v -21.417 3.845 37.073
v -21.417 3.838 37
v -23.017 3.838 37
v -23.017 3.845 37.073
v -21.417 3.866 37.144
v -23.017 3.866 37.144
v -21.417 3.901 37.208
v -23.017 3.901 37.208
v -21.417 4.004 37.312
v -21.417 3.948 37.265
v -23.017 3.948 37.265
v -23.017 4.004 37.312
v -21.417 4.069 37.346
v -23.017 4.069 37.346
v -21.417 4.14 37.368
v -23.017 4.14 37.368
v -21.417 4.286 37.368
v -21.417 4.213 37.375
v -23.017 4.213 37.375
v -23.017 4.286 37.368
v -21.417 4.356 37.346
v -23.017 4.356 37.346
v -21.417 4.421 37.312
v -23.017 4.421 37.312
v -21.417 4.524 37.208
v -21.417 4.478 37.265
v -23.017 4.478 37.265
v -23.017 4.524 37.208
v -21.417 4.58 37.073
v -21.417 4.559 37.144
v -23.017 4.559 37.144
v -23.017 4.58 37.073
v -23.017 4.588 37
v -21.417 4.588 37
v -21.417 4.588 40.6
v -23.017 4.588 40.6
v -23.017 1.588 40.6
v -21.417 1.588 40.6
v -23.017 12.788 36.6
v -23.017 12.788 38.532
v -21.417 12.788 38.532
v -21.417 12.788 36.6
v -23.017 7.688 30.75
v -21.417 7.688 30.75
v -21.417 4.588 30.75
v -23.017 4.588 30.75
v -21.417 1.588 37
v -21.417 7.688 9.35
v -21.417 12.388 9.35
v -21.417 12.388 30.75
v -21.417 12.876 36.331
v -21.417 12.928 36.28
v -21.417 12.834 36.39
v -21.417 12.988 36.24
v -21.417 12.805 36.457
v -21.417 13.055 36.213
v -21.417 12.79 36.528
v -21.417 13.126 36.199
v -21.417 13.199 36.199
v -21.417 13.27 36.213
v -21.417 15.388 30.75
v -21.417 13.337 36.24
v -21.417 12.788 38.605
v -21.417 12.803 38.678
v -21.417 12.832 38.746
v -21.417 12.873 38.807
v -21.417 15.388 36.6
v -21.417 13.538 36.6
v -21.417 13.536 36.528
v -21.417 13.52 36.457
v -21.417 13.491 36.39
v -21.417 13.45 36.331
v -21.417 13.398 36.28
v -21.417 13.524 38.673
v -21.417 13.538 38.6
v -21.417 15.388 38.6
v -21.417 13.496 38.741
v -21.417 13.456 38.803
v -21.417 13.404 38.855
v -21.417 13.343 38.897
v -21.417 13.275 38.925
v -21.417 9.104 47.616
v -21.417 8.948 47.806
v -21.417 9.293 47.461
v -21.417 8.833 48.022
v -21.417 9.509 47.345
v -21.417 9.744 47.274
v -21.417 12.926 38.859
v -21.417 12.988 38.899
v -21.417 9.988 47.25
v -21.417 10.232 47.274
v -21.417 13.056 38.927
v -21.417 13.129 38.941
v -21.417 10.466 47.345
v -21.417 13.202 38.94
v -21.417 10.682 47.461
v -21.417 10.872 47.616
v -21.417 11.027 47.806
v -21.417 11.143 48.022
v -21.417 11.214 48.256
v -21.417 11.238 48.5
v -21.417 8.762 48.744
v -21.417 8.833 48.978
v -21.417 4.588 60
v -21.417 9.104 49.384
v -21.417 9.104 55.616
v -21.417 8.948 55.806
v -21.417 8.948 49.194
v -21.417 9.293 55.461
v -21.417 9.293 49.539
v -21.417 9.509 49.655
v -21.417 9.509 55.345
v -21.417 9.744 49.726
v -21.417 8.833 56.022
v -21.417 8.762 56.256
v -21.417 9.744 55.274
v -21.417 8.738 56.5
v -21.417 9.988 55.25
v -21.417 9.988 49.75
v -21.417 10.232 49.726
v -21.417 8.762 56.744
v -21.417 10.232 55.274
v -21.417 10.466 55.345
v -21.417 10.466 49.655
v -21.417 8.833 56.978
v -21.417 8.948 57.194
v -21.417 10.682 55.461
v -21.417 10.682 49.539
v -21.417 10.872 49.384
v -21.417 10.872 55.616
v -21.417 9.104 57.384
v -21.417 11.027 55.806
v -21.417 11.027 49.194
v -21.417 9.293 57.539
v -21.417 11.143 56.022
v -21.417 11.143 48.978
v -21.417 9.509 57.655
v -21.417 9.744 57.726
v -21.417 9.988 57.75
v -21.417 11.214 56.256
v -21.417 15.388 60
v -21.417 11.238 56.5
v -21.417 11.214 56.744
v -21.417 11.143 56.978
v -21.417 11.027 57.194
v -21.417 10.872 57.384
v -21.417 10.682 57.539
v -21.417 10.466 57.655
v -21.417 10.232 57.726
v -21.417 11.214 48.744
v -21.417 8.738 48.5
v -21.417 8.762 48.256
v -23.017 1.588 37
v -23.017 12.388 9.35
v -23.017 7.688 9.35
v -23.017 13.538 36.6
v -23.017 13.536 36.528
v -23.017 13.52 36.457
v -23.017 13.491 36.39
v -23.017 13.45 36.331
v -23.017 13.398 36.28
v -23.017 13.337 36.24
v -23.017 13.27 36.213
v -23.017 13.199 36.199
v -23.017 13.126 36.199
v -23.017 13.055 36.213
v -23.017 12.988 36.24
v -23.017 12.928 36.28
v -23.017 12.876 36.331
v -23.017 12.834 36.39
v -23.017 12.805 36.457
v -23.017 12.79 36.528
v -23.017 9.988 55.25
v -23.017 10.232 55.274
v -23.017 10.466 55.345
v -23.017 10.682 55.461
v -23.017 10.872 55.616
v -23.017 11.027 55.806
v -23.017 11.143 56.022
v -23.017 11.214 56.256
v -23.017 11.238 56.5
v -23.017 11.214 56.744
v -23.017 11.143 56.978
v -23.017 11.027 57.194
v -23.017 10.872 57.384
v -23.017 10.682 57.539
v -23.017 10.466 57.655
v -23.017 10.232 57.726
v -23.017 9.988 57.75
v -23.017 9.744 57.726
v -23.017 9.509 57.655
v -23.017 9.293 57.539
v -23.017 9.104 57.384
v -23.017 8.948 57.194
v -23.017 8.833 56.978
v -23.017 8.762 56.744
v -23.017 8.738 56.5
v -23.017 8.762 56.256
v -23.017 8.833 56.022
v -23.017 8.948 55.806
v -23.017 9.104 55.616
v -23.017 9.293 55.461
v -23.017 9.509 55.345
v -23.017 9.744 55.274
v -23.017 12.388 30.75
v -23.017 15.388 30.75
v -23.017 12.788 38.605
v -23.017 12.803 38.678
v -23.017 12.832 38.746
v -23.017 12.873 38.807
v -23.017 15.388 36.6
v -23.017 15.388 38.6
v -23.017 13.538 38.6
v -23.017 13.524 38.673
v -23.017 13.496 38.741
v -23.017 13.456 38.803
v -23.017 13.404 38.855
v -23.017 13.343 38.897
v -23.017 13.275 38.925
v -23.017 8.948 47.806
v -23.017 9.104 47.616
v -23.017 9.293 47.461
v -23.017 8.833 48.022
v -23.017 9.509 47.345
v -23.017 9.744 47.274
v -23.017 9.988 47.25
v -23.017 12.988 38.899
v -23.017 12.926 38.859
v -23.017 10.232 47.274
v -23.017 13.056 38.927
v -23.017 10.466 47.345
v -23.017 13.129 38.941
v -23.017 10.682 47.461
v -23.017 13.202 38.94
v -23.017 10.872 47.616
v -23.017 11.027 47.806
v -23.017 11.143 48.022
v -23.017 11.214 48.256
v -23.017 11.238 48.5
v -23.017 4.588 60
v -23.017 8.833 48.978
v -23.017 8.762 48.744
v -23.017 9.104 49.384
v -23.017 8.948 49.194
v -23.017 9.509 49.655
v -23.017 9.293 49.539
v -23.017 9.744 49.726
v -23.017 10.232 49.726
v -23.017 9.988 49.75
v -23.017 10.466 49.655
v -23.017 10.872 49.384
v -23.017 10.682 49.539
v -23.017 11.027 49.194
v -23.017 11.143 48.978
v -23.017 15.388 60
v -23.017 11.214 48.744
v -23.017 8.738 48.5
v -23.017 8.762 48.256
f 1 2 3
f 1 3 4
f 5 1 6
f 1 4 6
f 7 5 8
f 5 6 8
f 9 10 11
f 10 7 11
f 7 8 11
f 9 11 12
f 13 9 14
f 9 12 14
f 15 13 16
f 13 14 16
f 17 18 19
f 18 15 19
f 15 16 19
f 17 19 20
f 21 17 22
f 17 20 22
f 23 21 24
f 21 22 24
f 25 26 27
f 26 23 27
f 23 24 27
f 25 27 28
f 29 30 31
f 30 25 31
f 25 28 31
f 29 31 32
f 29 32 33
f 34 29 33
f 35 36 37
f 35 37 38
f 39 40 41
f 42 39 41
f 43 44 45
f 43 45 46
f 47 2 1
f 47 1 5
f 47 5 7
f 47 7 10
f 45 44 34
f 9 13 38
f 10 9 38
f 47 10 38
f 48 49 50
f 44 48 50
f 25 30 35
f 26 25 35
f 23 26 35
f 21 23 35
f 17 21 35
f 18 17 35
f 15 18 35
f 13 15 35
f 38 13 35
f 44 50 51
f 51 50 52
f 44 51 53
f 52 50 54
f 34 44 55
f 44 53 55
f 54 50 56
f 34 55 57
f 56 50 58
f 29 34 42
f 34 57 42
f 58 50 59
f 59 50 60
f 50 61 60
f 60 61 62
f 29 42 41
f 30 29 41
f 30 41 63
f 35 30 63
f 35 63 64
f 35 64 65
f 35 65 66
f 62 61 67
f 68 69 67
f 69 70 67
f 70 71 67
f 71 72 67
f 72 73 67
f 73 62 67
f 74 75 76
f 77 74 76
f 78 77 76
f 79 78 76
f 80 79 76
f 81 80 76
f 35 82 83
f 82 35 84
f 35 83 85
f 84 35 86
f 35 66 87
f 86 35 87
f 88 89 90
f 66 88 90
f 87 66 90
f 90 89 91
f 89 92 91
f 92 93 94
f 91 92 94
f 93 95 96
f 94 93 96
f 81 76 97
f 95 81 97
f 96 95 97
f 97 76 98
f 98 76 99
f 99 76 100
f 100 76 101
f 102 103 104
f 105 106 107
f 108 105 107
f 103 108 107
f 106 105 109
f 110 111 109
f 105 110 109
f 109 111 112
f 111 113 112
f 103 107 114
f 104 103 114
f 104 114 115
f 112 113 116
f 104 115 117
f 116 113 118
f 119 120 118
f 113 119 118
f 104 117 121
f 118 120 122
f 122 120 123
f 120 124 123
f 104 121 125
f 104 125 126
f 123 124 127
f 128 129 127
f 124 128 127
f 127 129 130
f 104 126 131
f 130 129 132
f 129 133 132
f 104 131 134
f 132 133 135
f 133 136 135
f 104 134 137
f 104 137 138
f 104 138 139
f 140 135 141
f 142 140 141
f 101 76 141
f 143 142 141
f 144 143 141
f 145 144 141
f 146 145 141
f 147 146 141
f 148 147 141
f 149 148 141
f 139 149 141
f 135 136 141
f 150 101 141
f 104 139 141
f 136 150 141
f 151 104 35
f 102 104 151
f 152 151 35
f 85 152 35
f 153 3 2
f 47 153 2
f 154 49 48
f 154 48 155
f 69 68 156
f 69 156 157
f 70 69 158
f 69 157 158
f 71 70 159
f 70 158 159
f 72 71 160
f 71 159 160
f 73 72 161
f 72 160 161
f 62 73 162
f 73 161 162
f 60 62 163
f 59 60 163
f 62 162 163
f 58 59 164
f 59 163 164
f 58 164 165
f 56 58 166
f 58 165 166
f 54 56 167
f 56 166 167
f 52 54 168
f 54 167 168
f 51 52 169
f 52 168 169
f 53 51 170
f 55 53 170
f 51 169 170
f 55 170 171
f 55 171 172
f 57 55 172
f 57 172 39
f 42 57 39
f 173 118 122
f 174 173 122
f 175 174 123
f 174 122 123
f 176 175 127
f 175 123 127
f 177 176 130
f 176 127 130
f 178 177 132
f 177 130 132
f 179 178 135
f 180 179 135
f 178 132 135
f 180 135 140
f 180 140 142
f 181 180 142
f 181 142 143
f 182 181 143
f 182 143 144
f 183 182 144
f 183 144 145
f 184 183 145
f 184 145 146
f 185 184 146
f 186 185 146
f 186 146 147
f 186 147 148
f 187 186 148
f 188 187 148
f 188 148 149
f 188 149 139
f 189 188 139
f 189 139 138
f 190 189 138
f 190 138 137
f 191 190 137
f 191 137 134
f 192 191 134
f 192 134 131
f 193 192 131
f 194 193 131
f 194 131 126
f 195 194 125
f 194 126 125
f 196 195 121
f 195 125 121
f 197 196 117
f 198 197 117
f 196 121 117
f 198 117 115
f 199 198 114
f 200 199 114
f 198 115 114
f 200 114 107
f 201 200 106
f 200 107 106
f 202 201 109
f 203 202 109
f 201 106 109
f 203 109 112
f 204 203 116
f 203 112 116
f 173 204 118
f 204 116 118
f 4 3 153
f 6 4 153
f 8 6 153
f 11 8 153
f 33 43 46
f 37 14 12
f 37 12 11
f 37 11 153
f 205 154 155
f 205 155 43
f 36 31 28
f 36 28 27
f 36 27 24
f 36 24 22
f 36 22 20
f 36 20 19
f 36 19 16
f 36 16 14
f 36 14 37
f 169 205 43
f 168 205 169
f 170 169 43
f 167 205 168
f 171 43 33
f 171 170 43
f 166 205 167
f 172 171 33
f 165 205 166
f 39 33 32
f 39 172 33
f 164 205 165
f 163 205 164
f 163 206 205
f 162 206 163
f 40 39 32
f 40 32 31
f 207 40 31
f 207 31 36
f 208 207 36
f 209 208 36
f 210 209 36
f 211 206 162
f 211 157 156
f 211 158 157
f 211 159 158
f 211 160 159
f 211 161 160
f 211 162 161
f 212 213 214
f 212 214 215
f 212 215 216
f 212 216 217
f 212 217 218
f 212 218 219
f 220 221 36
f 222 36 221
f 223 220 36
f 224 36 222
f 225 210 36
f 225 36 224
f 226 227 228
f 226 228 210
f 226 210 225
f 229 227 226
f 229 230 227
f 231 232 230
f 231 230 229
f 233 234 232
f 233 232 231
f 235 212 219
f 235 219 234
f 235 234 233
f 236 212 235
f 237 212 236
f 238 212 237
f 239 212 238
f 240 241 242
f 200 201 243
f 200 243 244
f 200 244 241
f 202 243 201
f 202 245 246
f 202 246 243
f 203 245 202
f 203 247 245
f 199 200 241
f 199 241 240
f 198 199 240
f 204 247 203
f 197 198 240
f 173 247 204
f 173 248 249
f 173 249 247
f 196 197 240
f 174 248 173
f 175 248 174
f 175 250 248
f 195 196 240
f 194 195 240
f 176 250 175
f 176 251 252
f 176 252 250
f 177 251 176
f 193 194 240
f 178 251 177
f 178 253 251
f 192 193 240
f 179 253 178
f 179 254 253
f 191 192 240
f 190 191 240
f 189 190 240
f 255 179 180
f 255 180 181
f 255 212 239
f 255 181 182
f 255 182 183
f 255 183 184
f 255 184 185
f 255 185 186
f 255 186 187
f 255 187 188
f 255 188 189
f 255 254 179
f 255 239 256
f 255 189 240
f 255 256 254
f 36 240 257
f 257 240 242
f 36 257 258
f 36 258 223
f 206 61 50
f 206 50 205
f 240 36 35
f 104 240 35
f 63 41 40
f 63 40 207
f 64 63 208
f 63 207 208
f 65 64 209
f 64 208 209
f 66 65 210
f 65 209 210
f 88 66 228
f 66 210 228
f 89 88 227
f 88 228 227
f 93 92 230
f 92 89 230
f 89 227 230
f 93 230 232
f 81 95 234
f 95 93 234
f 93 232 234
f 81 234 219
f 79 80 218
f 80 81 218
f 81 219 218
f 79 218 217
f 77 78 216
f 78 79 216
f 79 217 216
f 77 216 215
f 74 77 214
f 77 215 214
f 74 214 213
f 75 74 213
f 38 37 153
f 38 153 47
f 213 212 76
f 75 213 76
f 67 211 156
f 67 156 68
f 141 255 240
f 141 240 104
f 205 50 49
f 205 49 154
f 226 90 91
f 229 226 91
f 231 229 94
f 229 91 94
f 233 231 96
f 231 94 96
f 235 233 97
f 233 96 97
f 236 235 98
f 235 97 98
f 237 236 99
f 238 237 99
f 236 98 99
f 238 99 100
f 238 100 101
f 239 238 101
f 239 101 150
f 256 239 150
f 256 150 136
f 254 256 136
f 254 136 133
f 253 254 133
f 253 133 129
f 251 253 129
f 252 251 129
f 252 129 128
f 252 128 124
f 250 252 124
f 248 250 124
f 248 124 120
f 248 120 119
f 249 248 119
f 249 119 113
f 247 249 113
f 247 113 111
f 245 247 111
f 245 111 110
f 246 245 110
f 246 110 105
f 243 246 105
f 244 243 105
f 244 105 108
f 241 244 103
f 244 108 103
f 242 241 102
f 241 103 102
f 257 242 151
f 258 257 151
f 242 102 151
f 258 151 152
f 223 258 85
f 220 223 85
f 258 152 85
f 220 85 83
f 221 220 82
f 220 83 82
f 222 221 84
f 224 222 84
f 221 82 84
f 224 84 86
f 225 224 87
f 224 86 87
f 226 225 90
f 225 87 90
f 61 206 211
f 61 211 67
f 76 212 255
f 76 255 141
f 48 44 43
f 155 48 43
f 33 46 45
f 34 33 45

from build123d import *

# Parameters (mm, degrees)
SZKIC1_W                    = 1.6
SZKIC1_H                    = 10.8
DODANIE_WYCI_GNI_CIE1_DEPTH = 60
SZKIC2_R                    = 1.25
WYTNIJ_WYCI_GNI_CIE1_DEPTH  = 60
SZKIC3_W                    = 1.6
SZKIC3_H                    = 2
WYTNIJ_WYCI_GNI_CIE2_DEPTH  = 2.6
SZKIC4_W                    = 1.6
SZKIC4_H                    = 2
DODANIE_WYCI_GNI_CIE2_DEPTH = 3
WYTNIJ_WYCI_GNI_CIE3_START  = -30.75
SZKIC6_W                    = 1.6
SZKIC6_H                    = 3
SZKIC6_H_2                  = 3.1
WYTNIJ_WYCI_GNI_CIE3_DEPTH  = 30.75
SZKIC7_W                    = 1.6
SZKIC7_H                    = 4.7
WYTNIJ_WYCI_GNI_CIE4_DEPTH  = 9.35
SZKIC8_W                    = 1.6
SZKIC8_H                    = 1.6
DODANIE_WYCI_GNI_CIE3_DEPTH = 3
SZKIC9_R                    = 0.375
SZKIC9_R_2                  = 0.37655367
SZKIC9_R_3                  = 0.375938448
WYTNIJ_WYCI_GNI_CIE5_DEPTH  = 1.6


with BuildPart() as part:
    # Szkic1 → Dodanie-wyciągnięcie1 (new body)
    with BuildSketch(Plane.XY):
        with Locations((-22.216876634, 9.987687188)):
            Rectangle(SZKIC1_W, SZKIC1_H)
    extrude(amount=DODANIE_WYCI_GNI_CIE1_DEPTH)

    # Szkic2 → Wytnij-wyciągnięcie1 (cut)
    with BuildSketch(Plane(origin=(-21.416876634, 0, 0), x_dir=(0, 0, -1), z_dir=(1, 0, 0))):
        with Locations((-56.5, 9.987687188)):
            Circle(SZKIC2_R)
        with Locations((-48.5, 9.987687188)):
            Circle(SZKIC2_R)
    extrude(amount=-WYTNIJ_WYCI_GNI_CIE1_DEPTH, mode=Mode.SUBTRACT)

    # Szkic3 → Wytnij-wyciągnięcie2 (cut)
    with BuildSketch(Plane(origin=(0, 15.387687188, 0), x_dir=(1, 0, 0), z_dir=(0, 1, 0))):
        with Locations((-22.216876634, -37.6)):
            Rectangle(SZKIC3_W, SZKIC3_H)
    extrude(amount=-WYTNIJ_WYCI_GNI_CIE2_DEPTH, mode=Mode.SUBTRACT)

    # Szkic4 → Dodanie-wyciągnięcie2 (add)
    with BuildSketch(Plane.XZ.offset(-4.587687188)):
        with Locations((-22.216876634, 39.6)):
            Rectangle(SZKIC4_W, SZKIC4_H)
    extrude(amount=DODANIE_WYCI_GNI_CIE2_DEPTH)

    # Szkic6 → Wytnij-wyciągnięcie3 (cut)
    with BuildSketch(Plane(origin=(0, 0, 0), x_dir=(-1, 0, 0), z_dir=(0, 0, -1)).offset(WYTNIJ_WYCI_GNI_CIE3_START)):
        with Locations((22.216876634, 13.887687188)):
            Rectangle(SZKIC6_W, SZKIC6_H)
        with Locations((22.216876634, 6.137687188)):
            Rectangle(SZKIC6_W, SZKIC6_H_2)
    extrude(amount=WYTNIJ_WYCI_GNI_CIE3_DEPTH, mode=Mode.SUBTRACT)

    # Szkic7 → Wytnij-wyciągnięcie4 (cut)
    with BuildSketch(Plane(origin=(0, 0, 0), x_dir=(-1, 0, 0), z_dir=(0, 0, -1))):
        with Locations((22.216876634, 10.037687188)):
            Rectangle(SZKIC7_W, SZKIC7_H)
    extrude(amount=-WYTNIJ_WYCI_GNI_CIE4_DEPTH, mode=Mode.SUBTRACT)

    # Szkic8 → Dodanie-wyciągnięcie3 (add)
    with BuildSketch(Plane.XZ.offset(-4.587687188)):
        with Locations((-22.216876634, 37.8)):
            Rectangle(SZKIC8_W, SZKIC8_H)
    extrude(amount=DODANIE_WYCI_GNI_CIE3_DEPTH)

    # Szkic9 → Wytnij-wyciągnięcie5 (cut)
    with BuildSketch(Plane.ZY.offset(23.016876634)):
        with Locations((37, 4.212687188)):
            Circle(SZKIC9_R)
        with Locations((38.565828862, 13.162687188)):
            Circle(SZKIC9_R_2)
        with Locations((36.573453505, 13.162687188)):
            Circle(SZKIC9_R_3)
    extrude(amount=-WYTNIJ_WYCI_GNI_CIE5_DEPTH, mode=Mode.SUBTRACT)


solid = part.part
